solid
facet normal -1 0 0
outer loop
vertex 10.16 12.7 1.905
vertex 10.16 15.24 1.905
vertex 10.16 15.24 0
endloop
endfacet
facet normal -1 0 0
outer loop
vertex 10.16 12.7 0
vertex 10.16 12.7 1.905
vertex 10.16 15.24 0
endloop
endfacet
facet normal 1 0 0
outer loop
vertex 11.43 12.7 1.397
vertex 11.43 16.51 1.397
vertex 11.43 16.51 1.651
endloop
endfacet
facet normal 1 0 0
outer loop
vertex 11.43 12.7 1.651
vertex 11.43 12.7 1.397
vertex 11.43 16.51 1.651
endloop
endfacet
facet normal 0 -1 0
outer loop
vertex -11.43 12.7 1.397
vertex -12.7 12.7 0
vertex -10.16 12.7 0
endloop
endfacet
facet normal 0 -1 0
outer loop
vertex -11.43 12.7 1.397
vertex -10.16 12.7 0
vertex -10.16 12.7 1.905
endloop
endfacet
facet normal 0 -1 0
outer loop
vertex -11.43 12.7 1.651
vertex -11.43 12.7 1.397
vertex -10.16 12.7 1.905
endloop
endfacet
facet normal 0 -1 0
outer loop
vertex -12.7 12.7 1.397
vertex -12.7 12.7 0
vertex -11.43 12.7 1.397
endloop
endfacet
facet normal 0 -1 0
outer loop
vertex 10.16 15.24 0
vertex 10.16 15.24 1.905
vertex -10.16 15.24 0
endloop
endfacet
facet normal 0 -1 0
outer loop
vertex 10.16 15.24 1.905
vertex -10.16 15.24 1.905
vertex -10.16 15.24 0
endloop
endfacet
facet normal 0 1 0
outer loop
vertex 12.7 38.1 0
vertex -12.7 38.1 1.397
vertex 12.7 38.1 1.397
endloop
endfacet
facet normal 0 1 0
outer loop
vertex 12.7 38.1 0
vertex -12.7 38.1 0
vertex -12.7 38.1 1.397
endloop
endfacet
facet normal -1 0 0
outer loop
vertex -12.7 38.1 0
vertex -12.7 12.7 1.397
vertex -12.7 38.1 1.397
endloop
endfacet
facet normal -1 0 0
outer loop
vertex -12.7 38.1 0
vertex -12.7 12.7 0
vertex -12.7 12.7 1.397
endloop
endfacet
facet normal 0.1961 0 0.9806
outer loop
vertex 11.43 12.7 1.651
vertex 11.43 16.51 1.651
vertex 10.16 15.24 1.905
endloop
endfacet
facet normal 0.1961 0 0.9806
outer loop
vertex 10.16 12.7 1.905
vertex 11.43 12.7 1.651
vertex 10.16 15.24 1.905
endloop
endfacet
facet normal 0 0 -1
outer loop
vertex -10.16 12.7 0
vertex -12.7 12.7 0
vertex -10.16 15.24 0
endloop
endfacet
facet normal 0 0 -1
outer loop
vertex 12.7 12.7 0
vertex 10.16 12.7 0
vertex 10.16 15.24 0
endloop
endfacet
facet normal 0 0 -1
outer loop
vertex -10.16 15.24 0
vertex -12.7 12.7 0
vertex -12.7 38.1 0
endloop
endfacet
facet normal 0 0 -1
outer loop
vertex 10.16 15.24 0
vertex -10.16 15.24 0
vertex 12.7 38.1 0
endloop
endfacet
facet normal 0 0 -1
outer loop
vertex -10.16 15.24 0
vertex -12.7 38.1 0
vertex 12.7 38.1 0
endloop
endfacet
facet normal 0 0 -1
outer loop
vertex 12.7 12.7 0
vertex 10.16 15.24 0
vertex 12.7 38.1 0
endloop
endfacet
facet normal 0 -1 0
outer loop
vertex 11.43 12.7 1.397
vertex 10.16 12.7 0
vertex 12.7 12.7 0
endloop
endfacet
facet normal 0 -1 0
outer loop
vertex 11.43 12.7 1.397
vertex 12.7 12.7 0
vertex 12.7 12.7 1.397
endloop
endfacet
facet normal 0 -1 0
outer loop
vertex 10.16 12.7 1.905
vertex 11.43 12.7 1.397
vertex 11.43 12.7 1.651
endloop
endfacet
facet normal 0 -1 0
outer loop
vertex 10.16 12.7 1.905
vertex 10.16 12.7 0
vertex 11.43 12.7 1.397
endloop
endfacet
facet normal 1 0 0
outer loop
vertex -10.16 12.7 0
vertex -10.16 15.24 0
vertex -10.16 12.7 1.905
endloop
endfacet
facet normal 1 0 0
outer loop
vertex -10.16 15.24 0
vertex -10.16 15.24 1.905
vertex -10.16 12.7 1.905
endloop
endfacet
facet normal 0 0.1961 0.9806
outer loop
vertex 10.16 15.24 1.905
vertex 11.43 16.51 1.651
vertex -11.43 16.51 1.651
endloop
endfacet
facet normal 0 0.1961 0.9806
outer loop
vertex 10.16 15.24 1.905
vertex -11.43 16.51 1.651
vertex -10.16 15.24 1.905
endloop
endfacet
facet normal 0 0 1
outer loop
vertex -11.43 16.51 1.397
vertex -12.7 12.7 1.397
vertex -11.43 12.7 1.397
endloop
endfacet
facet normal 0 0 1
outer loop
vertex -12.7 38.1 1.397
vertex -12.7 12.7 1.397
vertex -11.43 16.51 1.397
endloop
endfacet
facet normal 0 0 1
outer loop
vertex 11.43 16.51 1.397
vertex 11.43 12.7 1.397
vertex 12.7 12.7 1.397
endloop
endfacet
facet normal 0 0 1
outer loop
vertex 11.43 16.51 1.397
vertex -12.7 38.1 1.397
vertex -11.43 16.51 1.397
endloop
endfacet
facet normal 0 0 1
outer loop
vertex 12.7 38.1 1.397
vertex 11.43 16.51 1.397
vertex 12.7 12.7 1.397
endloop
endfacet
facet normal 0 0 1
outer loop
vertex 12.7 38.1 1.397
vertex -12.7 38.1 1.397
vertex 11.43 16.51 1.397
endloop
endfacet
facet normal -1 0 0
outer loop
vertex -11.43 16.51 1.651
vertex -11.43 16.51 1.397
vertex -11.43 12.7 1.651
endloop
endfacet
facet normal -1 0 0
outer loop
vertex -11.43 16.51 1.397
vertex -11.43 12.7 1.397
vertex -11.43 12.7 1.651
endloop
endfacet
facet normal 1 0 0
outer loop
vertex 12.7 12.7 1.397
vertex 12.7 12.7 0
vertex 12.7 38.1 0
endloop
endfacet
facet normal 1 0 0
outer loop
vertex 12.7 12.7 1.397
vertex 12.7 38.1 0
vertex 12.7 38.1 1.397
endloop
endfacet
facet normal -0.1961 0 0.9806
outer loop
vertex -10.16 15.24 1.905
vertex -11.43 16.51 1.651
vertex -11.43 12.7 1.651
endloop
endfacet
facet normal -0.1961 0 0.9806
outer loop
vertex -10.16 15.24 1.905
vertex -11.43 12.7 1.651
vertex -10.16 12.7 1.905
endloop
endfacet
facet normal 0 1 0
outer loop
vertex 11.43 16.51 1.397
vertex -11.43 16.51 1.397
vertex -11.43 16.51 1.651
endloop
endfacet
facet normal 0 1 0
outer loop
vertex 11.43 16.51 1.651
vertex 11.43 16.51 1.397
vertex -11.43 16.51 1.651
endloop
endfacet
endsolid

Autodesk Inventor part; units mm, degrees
ref_plane "YZ Plane" through (0, 0, 0) normal (1, 0, 0) x (0, 1, 0)
ref_plane "XZ Plane" through (0, 0, 0) normal (0, 1, 0) x (-1, 0, 0)
sketch "Sketch1" plane through (0, 0, 0) normal (0, 0, 1) x (1, 0, 0)
  line L0 (-12.7, 38.1) -> (12.7, 38.1)
  line L1 (12.7, 38.1) -> (12.7, -38.1)
  line L2 (12.7, -38.1) -> (-12.7, -38.1)
  line L3 (-12.7, -38.1) -> (-12.7, 38.1)
  line L4 (-12.7, 38.1) -> (12.7, -38.1) construction
  line L5 (12.7, 38.1) -> (-12.7, -38.1) construction
  point P0 (0, 0)
  dimension "d0" = 25.4
  dimension "d1" = 76.2
extrude "Extrusion1" add sketch "Sketch1" along normal blind 1.397
sketch "Sketch2" plane through (0, 0, 1.397) normal (0, 0, 1) x (1, 0, 0)
  line L0 (-10.16, -38.1) -> (10.16, -38.1)
  line L1 (10.16, -38.1) -> (10.16, 15.24)
  line L2 (10.16, 15.24) -> (-10.16, 15.24)
  line L3 (-10.16, 15.24) -> (-10.16, -38.1)
  line L4 (-12.7, -38.1) -> (12.7, -38.1) projected
  point P0 (0, 0)
  point P1 (0, -38.1)
  dimension "d4" = 20.32
  dimension "d5" = 53.34
extrude "Extrusion2" cut sketch "Sketch2" against normal through all
sketch "Sketch3" plane through (12.7, -38.1, 0) normal (1, 0, 0) x (0, 0, -1)
  line L0 (0, 76.2) -> (0, 0) projected
  line L1 (0, 76.2) -> (-1.397, 76.2) projected
  line L2 (-1.397, 0) -> (-1.397, 76.2) projected
  line L3 (0, 0) -> (-1.397, 0) projected
  line L4 (-1.397, 0) -> (-1.905, 0)
  line L5 (-1.397, 0) -> (-1.397, 1.27)
  line L6 (-1.397, 53.34) -> (-1.397, 0) projected
  line L7 (-1.651, 1.27) -> (-1.397, 1.27)
  line L8 (-1.651, 1.27) -> (-1.905, 0)
  point P0 (0, 38.1)
  dimension "d8" = 0.508
  dimension "d9" = 1.27
  dimension "d10" = 0.254
ref_plane "Work Plane1" through (0, 0, 1.651) normal (0, 0, 1) x (1, 0, 0)
sketch "Sketch6" plane through (0, 0, 1.651) normal (0, 0, 1) x (1, 0, 0)
  line L0 (12.7, -36.83) -> (12.7, -38.1) projected
  line L1 (12.7, -38.1) -> (12.7, 38.1) projected
  line L2 (12.7, -37.465) -> (10.795, -37.465)
  line L3 (10.16, -38.1) -> (12.7, -38.1) projected
  line L4 (10.16, 15.24) -> (10.16, -38.1) projected
  line L5 (10.795, -37.465) -> (10.795, 15.875)
  line L6 (10.795, 15.875) -> (-10.795, 15.875)
  line L7 (-10.795, 15.875) -> (-10.795, -37.465)
  line L8 (-10.795, -37.465) -> (-12.7255, -37.465)
  line L9 (-12.7, -38.1) -> (-10.16, -38.1) projected
  line L10 (-10.16, -38.1) -> (-10.16, 15.24) projected
  line L11 (-10.16, 15.24) -> (10.16, 15.24) projected
  point P0 (0, 0)
  dimension "d12" = 0.635
  dimension "d13" = 0.635
  dimension "d14" = 0.635
  dimension "d15" = 0.635
  dimension "d16" = 0.635
sweep "Sweep1" add profiles "Sketch3" path "Sketch6" path curves L2 L5 L6 L7 L8 contours L4 L8 L7 L2
ref_plane "Work Plane3" through (-12.7, 12.7, 0) normal (0, -1, 0) x (1, 0, 0)
ref_plane "Work Plane2" through (-12.7, -12.7, 0) normal (0, -1, 0) x (1, 0, 0)
split "Split3" plane through (-12.7, -12.7, 0) removes the side toward (0, -1, 0)
split "Split5" plane through (-12.7, 12.7, 0) removes the side toward (0, -1, 0)
properties part number "door-frame"
